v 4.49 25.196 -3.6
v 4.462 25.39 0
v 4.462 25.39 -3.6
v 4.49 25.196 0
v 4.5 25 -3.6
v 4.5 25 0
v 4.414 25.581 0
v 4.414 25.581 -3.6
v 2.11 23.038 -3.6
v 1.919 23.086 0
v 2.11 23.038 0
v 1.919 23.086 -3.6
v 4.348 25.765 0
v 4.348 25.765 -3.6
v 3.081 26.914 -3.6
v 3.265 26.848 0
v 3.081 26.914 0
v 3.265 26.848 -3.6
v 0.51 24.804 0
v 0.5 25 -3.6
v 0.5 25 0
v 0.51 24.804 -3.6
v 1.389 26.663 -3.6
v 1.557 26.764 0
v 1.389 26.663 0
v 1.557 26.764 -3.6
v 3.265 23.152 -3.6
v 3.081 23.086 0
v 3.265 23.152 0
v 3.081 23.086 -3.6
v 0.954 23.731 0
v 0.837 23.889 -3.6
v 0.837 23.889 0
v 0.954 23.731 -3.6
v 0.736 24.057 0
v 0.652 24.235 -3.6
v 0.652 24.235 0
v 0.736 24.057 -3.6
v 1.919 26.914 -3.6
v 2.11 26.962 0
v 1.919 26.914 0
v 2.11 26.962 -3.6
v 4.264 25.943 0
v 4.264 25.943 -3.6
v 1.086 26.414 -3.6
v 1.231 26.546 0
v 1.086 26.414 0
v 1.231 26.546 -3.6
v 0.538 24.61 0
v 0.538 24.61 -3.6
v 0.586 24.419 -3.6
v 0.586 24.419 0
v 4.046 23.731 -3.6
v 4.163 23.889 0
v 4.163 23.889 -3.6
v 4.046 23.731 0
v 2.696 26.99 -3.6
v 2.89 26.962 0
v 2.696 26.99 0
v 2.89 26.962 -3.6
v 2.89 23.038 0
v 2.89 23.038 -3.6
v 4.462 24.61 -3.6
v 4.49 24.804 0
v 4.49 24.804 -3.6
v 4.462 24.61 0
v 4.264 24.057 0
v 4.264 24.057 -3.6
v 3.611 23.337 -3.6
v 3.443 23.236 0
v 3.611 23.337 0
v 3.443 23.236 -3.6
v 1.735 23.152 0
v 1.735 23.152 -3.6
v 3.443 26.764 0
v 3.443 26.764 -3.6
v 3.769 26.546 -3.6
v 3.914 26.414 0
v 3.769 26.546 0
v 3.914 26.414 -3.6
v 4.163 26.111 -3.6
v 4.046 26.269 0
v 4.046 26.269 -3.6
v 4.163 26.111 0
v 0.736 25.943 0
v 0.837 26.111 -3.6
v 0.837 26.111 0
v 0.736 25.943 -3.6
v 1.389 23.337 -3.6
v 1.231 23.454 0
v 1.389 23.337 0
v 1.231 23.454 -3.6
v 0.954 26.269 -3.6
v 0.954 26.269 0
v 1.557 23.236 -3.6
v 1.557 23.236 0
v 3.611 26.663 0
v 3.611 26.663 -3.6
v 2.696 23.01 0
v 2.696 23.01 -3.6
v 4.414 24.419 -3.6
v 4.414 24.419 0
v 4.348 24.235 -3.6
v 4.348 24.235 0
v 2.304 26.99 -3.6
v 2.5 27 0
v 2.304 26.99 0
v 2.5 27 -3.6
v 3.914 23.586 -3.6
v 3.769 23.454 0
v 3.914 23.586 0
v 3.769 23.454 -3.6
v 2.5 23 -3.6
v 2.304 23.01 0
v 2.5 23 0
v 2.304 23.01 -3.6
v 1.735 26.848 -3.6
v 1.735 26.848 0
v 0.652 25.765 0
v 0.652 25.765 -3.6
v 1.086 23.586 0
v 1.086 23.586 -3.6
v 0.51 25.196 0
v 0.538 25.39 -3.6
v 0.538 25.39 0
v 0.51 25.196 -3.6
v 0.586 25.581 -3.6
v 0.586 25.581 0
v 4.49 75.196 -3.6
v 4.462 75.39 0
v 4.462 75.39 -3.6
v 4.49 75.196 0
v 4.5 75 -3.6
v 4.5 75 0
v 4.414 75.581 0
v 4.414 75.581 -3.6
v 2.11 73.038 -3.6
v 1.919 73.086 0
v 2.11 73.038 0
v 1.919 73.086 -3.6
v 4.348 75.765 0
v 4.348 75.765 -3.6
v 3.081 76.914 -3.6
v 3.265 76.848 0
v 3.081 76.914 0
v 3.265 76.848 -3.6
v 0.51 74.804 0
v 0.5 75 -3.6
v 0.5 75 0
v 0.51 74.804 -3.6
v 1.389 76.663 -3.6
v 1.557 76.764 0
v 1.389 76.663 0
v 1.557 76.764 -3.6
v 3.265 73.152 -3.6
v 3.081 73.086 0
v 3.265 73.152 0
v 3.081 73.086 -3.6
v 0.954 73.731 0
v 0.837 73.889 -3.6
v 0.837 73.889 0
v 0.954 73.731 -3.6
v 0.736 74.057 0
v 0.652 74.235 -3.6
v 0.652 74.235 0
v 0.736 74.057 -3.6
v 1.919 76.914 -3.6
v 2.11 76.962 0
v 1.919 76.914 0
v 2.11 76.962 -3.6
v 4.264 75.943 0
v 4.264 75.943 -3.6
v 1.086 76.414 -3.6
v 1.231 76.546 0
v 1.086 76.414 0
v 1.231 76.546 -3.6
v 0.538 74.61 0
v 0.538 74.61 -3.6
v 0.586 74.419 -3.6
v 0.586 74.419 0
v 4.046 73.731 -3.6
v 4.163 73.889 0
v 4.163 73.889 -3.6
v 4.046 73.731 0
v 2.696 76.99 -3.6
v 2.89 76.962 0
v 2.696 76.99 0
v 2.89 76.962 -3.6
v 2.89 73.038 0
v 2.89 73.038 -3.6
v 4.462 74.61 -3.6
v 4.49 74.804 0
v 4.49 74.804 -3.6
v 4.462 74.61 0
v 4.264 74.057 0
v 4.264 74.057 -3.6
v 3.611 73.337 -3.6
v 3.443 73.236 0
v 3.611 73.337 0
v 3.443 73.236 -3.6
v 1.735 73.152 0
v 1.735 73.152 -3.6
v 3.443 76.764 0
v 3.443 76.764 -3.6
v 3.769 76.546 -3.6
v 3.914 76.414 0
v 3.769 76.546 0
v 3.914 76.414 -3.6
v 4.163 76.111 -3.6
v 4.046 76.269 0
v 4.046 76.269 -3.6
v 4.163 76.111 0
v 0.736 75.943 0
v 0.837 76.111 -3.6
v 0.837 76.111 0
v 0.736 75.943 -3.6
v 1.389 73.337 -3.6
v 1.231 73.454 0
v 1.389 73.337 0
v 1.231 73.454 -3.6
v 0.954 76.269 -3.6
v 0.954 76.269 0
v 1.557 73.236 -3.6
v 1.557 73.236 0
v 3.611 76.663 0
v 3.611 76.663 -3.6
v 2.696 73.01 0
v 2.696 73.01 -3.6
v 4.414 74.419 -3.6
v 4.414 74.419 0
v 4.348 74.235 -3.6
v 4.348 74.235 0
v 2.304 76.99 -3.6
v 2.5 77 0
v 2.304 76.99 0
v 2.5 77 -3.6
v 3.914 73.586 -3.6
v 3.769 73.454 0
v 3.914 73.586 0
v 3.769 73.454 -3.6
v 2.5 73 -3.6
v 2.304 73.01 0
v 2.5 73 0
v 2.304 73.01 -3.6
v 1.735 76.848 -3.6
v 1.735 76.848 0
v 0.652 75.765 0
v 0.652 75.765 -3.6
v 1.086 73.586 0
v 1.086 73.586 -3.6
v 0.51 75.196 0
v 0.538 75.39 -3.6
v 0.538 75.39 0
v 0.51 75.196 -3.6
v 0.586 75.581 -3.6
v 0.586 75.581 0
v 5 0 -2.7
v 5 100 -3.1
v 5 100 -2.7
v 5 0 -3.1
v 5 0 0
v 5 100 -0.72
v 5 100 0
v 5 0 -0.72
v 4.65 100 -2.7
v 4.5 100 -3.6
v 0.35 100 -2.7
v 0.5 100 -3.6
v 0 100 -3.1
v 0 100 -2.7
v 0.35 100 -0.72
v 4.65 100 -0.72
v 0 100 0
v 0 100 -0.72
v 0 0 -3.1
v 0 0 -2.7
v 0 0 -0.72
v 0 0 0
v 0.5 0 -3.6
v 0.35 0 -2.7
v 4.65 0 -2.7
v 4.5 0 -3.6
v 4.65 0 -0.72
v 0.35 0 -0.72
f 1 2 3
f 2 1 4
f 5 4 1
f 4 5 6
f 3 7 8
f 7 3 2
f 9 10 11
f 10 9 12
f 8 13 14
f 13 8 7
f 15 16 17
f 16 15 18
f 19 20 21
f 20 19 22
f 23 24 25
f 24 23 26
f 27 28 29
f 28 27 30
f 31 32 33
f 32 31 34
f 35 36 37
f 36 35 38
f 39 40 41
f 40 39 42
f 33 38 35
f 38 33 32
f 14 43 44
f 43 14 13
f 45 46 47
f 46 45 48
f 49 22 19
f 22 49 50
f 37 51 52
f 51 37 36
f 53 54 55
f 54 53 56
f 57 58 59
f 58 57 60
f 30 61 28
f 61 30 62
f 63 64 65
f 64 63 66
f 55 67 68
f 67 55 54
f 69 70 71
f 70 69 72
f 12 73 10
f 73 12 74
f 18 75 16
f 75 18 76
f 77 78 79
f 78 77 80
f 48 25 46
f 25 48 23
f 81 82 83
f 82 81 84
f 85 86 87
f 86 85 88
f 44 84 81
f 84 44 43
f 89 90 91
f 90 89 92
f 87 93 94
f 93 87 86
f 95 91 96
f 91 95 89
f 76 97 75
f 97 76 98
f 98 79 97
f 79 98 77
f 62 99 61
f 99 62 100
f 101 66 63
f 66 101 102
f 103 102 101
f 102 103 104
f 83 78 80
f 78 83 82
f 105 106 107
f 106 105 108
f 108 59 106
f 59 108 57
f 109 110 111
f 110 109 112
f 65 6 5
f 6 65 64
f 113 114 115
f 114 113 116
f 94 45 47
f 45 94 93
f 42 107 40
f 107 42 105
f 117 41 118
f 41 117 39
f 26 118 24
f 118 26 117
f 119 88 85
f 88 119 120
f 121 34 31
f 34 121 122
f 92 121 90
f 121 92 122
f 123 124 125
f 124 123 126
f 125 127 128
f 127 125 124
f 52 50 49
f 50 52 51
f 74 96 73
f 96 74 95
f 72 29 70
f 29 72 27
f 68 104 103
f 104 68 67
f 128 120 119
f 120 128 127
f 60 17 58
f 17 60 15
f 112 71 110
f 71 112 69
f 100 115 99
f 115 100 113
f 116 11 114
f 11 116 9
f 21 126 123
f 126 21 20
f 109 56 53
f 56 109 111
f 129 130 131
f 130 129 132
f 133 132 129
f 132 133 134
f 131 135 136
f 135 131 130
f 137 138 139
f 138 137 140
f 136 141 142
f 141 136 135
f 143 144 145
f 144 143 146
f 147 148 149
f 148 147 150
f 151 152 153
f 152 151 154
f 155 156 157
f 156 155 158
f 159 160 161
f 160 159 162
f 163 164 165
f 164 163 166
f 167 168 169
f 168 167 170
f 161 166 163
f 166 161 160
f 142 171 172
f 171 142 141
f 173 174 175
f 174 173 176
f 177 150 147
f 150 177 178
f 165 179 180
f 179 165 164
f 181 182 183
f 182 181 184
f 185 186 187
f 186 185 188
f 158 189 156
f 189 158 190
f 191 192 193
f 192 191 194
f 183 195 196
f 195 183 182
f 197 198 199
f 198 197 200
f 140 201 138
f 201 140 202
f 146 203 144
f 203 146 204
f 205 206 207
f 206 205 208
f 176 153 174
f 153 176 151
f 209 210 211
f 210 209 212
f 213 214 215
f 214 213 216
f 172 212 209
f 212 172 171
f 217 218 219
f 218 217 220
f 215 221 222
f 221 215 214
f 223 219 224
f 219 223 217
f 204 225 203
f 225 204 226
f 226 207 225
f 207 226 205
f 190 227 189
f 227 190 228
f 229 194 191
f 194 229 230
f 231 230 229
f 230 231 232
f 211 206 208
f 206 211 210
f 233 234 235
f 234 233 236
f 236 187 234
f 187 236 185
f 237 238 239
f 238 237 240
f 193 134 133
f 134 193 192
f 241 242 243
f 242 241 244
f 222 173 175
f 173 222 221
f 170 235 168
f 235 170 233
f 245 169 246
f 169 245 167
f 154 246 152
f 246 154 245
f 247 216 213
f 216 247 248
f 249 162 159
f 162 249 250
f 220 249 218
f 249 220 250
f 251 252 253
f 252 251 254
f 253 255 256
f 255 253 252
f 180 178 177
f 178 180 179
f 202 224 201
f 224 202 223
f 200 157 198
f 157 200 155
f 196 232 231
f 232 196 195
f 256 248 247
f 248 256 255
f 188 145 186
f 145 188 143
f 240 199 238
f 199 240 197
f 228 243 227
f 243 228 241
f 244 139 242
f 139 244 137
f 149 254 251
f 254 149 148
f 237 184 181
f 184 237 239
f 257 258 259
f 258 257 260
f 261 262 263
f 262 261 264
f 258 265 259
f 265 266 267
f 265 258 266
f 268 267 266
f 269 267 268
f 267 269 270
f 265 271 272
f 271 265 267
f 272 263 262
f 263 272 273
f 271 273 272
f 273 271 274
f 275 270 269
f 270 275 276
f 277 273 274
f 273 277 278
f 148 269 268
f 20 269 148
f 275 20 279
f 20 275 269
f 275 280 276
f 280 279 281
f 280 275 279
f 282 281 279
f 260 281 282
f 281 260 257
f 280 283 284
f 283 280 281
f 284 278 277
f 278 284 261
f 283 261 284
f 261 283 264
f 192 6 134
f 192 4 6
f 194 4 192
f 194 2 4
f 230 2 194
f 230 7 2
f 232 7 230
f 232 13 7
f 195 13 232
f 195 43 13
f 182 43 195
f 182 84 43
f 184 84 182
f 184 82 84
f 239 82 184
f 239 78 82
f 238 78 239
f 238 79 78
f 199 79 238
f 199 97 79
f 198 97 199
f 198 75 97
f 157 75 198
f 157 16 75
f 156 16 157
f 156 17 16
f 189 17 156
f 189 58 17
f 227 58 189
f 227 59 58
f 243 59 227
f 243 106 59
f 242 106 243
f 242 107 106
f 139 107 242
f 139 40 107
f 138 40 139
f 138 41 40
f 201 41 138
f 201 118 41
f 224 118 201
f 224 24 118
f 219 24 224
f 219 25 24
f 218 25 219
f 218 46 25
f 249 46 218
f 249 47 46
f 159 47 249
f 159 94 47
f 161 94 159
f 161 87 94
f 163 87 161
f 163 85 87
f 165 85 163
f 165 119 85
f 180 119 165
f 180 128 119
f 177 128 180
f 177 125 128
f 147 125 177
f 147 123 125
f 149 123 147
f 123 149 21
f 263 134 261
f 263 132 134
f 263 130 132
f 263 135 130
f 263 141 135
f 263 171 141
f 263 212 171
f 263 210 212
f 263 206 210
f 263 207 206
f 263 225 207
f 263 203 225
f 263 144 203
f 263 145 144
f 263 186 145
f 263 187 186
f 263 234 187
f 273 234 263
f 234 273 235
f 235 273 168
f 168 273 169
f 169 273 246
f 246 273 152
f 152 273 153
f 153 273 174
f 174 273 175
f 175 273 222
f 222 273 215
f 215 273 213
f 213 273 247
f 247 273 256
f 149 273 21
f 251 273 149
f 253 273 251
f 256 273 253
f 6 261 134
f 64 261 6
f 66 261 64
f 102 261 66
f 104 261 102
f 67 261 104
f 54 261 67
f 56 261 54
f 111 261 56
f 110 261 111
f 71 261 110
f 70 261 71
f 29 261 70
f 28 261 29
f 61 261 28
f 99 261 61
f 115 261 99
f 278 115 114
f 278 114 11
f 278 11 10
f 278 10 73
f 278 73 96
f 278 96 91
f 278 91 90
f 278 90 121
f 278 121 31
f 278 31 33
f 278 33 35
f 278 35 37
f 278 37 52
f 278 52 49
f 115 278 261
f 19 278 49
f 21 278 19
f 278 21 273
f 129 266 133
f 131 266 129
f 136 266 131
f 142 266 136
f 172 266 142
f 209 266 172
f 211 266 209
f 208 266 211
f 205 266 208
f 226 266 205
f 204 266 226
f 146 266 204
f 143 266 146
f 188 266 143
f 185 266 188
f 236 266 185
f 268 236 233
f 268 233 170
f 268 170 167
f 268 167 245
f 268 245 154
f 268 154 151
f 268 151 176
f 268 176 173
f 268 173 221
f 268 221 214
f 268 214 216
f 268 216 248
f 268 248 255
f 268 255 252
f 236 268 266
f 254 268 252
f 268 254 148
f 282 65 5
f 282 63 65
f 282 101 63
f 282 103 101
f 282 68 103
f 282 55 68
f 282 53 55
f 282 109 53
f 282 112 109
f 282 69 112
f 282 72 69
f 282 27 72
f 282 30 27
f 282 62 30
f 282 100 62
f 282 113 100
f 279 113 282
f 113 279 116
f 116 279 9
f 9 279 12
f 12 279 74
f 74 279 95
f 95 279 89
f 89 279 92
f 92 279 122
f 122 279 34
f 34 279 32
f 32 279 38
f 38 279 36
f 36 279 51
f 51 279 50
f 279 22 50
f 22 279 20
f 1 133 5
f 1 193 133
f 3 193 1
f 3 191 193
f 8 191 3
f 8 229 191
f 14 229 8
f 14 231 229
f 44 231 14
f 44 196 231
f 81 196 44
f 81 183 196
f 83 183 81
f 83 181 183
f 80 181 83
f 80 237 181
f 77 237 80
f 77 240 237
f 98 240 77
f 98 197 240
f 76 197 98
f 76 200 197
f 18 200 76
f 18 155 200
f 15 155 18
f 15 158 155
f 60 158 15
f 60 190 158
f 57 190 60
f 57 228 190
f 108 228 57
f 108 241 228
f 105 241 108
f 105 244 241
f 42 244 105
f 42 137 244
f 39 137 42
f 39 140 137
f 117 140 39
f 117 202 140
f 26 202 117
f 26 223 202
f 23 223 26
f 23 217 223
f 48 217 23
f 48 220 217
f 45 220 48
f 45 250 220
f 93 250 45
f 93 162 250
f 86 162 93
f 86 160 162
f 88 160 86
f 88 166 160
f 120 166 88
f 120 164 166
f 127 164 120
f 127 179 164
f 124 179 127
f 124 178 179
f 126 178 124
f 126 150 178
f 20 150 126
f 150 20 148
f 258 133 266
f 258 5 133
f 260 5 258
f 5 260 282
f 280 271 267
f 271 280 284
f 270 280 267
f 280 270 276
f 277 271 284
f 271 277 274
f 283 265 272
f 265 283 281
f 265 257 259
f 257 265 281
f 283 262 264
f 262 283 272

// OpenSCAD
$fn = 64;

rail_w = 5.0;
rail_h = 3.6;
rail_l = 100.0;

// Simple miniature linear guide rail profile:
// - Rectangular base with slightly chamfered top edges
// - Two shallow side relief grooves
// - Two mounting holes along length (counterbored)
module linear_guide_rail(w=rail_w, h=rail_h, l=rail_l) {
    chamfer = min(0.5, h*0.22);          // top edge chamfer
    groove_depth = min(0.35, w*0.10);    // side relief
    groove_h = h*0.55;
    groove_z0 = h*0.20;

    hole_d = 2.2;        // through hole
    cbore_d = 4.0;       // counterbore
    cbore_depth = 1.2;   // counterbore depth
    hole_x = w/2;
    hole_y_positions = [l*0.25, l*0.75];

    difference() {
        // Main body with chamfered top edges
        linear_extrude(height=l)
            polygon(points=[
                [0,0],
                [w,0],
                [w,h-chamfer],
                [w-chamfer,h],
                [chamfer,h],
                [0,h-chamfer]
            ]);

        // Side relief grooves (run full length)
        translate([0, groove_z0, 0])
            cube([groove_depth, groove_h, l], center=false);
        translate([w-groove_depth, groove_z0, 0])
            cube([groove_depth, groove_h, l], center=false);

        // Mounting holes (through + counterbore from top)
        for (yy = hole_y_positions) {
            // Through hole
            translate([hole_x, h/2, yy])
                rotate([90,0,0])
                    cylinder(d=hole_d, h=w+2, center=true);

            // Counterbore from top
            translate([hole_x, h - cbore_depth/2, yy])
                rotate([90,0,0])
                    cylinder(d=cbore_d, h=w+2, center=true);
        }
    }
}

// Orient length along Y for typical rail placement
rotate([-90,0,0]) linear_guide_rail();
